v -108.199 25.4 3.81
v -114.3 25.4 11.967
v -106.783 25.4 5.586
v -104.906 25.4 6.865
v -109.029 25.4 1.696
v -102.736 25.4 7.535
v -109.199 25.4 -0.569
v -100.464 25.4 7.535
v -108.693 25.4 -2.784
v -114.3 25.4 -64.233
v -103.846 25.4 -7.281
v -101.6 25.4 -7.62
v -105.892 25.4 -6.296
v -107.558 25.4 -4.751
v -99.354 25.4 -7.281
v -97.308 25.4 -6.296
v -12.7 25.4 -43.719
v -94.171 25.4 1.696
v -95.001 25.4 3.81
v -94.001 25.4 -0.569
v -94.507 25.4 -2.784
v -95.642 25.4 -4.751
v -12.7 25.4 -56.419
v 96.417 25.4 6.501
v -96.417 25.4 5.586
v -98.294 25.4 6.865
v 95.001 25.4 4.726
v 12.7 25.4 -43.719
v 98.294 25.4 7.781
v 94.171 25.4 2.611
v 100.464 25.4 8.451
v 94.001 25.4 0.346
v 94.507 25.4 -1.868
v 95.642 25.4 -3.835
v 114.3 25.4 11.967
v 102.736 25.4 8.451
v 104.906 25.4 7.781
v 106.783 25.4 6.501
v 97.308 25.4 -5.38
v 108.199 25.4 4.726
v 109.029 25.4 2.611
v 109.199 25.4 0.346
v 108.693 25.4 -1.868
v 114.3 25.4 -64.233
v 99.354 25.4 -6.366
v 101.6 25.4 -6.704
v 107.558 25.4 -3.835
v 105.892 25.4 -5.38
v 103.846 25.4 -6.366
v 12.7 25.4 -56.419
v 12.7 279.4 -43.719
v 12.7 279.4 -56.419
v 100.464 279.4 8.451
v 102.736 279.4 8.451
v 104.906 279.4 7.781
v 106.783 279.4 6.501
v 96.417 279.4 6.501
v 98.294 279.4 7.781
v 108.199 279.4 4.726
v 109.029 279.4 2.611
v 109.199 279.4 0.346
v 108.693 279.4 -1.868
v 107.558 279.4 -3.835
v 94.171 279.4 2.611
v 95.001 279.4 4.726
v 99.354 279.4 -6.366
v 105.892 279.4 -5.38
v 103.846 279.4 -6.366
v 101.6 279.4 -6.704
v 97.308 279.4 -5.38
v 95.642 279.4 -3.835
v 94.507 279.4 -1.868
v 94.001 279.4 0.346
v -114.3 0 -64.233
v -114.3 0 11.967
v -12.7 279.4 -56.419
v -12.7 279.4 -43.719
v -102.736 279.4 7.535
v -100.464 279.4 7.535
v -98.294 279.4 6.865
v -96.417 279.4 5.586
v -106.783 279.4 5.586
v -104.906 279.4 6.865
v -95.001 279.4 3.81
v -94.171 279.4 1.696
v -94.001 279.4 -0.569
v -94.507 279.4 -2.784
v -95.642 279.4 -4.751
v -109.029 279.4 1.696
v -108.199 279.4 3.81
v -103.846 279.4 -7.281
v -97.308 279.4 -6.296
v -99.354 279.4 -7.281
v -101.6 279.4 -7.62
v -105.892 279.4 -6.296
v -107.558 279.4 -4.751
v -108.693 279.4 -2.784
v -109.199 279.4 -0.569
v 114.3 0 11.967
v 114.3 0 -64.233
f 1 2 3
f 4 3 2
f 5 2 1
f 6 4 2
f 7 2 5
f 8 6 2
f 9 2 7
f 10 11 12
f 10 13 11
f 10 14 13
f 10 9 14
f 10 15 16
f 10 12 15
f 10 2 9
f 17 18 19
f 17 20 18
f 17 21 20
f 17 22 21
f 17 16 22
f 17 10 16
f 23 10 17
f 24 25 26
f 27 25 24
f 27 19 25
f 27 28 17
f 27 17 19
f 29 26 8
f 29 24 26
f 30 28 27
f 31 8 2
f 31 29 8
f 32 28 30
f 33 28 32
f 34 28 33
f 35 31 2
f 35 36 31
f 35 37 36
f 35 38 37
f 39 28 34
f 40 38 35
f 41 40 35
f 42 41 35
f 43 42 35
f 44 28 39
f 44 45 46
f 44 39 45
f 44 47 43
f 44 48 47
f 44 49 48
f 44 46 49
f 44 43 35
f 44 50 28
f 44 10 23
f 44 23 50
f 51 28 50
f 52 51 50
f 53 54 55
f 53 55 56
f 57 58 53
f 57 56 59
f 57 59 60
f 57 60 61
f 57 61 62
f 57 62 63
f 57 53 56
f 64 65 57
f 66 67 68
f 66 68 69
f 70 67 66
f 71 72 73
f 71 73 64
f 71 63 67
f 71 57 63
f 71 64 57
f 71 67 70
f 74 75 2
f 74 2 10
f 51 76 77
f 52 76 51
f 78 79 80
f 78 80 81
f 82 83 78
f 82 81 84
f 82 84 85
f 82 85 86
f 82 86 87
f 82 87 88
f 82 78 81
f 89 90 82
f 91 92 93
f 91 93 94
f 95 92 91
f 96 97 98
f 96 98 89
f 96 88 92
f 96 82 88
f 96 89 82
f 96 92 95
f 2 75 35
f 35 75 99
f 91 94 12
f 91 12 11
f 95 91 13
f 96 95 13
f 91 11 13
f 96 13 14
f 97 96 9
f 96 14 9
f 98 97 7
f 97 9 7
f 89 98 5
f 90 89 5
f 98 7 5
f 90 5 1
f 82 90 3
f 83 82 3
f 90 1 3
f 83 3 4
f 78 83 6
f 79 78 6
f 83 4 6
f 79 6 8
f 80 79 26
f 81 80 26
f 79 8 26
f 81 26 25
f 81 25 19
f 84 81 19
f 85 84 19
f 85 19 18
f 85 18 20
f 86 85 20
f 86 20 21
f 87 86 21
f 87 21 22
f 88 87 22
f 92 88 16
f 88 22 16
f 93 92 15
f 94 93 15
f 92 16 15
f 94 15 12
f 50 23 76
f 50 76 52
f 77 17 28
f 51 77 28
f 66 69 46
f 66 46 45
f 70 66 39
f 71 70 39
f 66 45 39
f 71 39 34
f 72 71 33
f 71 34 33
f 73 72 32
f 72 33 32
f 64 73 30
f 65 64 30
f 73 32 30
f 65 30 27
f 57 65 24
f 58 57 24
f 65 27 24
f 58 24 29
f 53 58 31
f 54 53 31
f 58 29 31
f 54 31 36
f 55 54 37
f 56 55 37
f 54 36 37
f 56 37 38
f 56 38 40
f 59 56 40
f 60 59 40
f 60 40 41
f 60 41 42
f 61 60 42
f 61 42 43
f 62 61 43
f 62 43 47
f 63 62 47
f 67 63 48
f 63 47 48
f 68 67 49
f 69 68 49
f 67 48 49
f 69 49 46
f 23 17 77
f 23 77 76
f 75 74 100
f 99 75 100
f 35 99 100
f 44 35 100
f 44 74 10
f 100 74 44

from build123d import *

# Parameters (mm, degrees)
SKETCH1_W           = 228.6
SKETCH1_H           = 76.2
BOSS_EXTRUDE1_DEPTH = 25.4
SKETCH2_R           = 7.62
SKETCH2_W           = 25.4
SKETCH2_H           = 12.7
BOSS_EXTRUDE2_DEPTH = 254


with BuildPart() as part:
    # Sketch1 → Boss-Extrude1 (new body)
    with BuildSketch(Plane(origin=(0, 0, 0), x_dir=(1, 0, 0), z_dir=(0, 1, 0))):
        with Locations((0, 26.13343465)):
            Rectangle(SKETCH1_W, SKETCH1_H)
    extrude(amount=BOSS_EXTRUDE1_DEPTH)

    # Sketch2 → Boss-Extrude2 (add)
    with BuildSketch(Plane(origin=(0, 25.4, 0), x_dir=(1, 0, 0), z_dir=(0, 1, 0))):
        with Locations(Location((-101.6, 0, 0), (0, 0, 90))):
            Circle(SKETCH2_R)
        with Locations(Location((101.6, -0.915640228, 0), (0, 0, 90))):
            Circle(SKETCH2_R)
        with Locations((0, 50.068949407)):
            Rectangle(SKETCH2_W, SKETCH2_H)
    extrude(amount=BOSS_EXTRUDE2_DEPTH)


solid = part.part
